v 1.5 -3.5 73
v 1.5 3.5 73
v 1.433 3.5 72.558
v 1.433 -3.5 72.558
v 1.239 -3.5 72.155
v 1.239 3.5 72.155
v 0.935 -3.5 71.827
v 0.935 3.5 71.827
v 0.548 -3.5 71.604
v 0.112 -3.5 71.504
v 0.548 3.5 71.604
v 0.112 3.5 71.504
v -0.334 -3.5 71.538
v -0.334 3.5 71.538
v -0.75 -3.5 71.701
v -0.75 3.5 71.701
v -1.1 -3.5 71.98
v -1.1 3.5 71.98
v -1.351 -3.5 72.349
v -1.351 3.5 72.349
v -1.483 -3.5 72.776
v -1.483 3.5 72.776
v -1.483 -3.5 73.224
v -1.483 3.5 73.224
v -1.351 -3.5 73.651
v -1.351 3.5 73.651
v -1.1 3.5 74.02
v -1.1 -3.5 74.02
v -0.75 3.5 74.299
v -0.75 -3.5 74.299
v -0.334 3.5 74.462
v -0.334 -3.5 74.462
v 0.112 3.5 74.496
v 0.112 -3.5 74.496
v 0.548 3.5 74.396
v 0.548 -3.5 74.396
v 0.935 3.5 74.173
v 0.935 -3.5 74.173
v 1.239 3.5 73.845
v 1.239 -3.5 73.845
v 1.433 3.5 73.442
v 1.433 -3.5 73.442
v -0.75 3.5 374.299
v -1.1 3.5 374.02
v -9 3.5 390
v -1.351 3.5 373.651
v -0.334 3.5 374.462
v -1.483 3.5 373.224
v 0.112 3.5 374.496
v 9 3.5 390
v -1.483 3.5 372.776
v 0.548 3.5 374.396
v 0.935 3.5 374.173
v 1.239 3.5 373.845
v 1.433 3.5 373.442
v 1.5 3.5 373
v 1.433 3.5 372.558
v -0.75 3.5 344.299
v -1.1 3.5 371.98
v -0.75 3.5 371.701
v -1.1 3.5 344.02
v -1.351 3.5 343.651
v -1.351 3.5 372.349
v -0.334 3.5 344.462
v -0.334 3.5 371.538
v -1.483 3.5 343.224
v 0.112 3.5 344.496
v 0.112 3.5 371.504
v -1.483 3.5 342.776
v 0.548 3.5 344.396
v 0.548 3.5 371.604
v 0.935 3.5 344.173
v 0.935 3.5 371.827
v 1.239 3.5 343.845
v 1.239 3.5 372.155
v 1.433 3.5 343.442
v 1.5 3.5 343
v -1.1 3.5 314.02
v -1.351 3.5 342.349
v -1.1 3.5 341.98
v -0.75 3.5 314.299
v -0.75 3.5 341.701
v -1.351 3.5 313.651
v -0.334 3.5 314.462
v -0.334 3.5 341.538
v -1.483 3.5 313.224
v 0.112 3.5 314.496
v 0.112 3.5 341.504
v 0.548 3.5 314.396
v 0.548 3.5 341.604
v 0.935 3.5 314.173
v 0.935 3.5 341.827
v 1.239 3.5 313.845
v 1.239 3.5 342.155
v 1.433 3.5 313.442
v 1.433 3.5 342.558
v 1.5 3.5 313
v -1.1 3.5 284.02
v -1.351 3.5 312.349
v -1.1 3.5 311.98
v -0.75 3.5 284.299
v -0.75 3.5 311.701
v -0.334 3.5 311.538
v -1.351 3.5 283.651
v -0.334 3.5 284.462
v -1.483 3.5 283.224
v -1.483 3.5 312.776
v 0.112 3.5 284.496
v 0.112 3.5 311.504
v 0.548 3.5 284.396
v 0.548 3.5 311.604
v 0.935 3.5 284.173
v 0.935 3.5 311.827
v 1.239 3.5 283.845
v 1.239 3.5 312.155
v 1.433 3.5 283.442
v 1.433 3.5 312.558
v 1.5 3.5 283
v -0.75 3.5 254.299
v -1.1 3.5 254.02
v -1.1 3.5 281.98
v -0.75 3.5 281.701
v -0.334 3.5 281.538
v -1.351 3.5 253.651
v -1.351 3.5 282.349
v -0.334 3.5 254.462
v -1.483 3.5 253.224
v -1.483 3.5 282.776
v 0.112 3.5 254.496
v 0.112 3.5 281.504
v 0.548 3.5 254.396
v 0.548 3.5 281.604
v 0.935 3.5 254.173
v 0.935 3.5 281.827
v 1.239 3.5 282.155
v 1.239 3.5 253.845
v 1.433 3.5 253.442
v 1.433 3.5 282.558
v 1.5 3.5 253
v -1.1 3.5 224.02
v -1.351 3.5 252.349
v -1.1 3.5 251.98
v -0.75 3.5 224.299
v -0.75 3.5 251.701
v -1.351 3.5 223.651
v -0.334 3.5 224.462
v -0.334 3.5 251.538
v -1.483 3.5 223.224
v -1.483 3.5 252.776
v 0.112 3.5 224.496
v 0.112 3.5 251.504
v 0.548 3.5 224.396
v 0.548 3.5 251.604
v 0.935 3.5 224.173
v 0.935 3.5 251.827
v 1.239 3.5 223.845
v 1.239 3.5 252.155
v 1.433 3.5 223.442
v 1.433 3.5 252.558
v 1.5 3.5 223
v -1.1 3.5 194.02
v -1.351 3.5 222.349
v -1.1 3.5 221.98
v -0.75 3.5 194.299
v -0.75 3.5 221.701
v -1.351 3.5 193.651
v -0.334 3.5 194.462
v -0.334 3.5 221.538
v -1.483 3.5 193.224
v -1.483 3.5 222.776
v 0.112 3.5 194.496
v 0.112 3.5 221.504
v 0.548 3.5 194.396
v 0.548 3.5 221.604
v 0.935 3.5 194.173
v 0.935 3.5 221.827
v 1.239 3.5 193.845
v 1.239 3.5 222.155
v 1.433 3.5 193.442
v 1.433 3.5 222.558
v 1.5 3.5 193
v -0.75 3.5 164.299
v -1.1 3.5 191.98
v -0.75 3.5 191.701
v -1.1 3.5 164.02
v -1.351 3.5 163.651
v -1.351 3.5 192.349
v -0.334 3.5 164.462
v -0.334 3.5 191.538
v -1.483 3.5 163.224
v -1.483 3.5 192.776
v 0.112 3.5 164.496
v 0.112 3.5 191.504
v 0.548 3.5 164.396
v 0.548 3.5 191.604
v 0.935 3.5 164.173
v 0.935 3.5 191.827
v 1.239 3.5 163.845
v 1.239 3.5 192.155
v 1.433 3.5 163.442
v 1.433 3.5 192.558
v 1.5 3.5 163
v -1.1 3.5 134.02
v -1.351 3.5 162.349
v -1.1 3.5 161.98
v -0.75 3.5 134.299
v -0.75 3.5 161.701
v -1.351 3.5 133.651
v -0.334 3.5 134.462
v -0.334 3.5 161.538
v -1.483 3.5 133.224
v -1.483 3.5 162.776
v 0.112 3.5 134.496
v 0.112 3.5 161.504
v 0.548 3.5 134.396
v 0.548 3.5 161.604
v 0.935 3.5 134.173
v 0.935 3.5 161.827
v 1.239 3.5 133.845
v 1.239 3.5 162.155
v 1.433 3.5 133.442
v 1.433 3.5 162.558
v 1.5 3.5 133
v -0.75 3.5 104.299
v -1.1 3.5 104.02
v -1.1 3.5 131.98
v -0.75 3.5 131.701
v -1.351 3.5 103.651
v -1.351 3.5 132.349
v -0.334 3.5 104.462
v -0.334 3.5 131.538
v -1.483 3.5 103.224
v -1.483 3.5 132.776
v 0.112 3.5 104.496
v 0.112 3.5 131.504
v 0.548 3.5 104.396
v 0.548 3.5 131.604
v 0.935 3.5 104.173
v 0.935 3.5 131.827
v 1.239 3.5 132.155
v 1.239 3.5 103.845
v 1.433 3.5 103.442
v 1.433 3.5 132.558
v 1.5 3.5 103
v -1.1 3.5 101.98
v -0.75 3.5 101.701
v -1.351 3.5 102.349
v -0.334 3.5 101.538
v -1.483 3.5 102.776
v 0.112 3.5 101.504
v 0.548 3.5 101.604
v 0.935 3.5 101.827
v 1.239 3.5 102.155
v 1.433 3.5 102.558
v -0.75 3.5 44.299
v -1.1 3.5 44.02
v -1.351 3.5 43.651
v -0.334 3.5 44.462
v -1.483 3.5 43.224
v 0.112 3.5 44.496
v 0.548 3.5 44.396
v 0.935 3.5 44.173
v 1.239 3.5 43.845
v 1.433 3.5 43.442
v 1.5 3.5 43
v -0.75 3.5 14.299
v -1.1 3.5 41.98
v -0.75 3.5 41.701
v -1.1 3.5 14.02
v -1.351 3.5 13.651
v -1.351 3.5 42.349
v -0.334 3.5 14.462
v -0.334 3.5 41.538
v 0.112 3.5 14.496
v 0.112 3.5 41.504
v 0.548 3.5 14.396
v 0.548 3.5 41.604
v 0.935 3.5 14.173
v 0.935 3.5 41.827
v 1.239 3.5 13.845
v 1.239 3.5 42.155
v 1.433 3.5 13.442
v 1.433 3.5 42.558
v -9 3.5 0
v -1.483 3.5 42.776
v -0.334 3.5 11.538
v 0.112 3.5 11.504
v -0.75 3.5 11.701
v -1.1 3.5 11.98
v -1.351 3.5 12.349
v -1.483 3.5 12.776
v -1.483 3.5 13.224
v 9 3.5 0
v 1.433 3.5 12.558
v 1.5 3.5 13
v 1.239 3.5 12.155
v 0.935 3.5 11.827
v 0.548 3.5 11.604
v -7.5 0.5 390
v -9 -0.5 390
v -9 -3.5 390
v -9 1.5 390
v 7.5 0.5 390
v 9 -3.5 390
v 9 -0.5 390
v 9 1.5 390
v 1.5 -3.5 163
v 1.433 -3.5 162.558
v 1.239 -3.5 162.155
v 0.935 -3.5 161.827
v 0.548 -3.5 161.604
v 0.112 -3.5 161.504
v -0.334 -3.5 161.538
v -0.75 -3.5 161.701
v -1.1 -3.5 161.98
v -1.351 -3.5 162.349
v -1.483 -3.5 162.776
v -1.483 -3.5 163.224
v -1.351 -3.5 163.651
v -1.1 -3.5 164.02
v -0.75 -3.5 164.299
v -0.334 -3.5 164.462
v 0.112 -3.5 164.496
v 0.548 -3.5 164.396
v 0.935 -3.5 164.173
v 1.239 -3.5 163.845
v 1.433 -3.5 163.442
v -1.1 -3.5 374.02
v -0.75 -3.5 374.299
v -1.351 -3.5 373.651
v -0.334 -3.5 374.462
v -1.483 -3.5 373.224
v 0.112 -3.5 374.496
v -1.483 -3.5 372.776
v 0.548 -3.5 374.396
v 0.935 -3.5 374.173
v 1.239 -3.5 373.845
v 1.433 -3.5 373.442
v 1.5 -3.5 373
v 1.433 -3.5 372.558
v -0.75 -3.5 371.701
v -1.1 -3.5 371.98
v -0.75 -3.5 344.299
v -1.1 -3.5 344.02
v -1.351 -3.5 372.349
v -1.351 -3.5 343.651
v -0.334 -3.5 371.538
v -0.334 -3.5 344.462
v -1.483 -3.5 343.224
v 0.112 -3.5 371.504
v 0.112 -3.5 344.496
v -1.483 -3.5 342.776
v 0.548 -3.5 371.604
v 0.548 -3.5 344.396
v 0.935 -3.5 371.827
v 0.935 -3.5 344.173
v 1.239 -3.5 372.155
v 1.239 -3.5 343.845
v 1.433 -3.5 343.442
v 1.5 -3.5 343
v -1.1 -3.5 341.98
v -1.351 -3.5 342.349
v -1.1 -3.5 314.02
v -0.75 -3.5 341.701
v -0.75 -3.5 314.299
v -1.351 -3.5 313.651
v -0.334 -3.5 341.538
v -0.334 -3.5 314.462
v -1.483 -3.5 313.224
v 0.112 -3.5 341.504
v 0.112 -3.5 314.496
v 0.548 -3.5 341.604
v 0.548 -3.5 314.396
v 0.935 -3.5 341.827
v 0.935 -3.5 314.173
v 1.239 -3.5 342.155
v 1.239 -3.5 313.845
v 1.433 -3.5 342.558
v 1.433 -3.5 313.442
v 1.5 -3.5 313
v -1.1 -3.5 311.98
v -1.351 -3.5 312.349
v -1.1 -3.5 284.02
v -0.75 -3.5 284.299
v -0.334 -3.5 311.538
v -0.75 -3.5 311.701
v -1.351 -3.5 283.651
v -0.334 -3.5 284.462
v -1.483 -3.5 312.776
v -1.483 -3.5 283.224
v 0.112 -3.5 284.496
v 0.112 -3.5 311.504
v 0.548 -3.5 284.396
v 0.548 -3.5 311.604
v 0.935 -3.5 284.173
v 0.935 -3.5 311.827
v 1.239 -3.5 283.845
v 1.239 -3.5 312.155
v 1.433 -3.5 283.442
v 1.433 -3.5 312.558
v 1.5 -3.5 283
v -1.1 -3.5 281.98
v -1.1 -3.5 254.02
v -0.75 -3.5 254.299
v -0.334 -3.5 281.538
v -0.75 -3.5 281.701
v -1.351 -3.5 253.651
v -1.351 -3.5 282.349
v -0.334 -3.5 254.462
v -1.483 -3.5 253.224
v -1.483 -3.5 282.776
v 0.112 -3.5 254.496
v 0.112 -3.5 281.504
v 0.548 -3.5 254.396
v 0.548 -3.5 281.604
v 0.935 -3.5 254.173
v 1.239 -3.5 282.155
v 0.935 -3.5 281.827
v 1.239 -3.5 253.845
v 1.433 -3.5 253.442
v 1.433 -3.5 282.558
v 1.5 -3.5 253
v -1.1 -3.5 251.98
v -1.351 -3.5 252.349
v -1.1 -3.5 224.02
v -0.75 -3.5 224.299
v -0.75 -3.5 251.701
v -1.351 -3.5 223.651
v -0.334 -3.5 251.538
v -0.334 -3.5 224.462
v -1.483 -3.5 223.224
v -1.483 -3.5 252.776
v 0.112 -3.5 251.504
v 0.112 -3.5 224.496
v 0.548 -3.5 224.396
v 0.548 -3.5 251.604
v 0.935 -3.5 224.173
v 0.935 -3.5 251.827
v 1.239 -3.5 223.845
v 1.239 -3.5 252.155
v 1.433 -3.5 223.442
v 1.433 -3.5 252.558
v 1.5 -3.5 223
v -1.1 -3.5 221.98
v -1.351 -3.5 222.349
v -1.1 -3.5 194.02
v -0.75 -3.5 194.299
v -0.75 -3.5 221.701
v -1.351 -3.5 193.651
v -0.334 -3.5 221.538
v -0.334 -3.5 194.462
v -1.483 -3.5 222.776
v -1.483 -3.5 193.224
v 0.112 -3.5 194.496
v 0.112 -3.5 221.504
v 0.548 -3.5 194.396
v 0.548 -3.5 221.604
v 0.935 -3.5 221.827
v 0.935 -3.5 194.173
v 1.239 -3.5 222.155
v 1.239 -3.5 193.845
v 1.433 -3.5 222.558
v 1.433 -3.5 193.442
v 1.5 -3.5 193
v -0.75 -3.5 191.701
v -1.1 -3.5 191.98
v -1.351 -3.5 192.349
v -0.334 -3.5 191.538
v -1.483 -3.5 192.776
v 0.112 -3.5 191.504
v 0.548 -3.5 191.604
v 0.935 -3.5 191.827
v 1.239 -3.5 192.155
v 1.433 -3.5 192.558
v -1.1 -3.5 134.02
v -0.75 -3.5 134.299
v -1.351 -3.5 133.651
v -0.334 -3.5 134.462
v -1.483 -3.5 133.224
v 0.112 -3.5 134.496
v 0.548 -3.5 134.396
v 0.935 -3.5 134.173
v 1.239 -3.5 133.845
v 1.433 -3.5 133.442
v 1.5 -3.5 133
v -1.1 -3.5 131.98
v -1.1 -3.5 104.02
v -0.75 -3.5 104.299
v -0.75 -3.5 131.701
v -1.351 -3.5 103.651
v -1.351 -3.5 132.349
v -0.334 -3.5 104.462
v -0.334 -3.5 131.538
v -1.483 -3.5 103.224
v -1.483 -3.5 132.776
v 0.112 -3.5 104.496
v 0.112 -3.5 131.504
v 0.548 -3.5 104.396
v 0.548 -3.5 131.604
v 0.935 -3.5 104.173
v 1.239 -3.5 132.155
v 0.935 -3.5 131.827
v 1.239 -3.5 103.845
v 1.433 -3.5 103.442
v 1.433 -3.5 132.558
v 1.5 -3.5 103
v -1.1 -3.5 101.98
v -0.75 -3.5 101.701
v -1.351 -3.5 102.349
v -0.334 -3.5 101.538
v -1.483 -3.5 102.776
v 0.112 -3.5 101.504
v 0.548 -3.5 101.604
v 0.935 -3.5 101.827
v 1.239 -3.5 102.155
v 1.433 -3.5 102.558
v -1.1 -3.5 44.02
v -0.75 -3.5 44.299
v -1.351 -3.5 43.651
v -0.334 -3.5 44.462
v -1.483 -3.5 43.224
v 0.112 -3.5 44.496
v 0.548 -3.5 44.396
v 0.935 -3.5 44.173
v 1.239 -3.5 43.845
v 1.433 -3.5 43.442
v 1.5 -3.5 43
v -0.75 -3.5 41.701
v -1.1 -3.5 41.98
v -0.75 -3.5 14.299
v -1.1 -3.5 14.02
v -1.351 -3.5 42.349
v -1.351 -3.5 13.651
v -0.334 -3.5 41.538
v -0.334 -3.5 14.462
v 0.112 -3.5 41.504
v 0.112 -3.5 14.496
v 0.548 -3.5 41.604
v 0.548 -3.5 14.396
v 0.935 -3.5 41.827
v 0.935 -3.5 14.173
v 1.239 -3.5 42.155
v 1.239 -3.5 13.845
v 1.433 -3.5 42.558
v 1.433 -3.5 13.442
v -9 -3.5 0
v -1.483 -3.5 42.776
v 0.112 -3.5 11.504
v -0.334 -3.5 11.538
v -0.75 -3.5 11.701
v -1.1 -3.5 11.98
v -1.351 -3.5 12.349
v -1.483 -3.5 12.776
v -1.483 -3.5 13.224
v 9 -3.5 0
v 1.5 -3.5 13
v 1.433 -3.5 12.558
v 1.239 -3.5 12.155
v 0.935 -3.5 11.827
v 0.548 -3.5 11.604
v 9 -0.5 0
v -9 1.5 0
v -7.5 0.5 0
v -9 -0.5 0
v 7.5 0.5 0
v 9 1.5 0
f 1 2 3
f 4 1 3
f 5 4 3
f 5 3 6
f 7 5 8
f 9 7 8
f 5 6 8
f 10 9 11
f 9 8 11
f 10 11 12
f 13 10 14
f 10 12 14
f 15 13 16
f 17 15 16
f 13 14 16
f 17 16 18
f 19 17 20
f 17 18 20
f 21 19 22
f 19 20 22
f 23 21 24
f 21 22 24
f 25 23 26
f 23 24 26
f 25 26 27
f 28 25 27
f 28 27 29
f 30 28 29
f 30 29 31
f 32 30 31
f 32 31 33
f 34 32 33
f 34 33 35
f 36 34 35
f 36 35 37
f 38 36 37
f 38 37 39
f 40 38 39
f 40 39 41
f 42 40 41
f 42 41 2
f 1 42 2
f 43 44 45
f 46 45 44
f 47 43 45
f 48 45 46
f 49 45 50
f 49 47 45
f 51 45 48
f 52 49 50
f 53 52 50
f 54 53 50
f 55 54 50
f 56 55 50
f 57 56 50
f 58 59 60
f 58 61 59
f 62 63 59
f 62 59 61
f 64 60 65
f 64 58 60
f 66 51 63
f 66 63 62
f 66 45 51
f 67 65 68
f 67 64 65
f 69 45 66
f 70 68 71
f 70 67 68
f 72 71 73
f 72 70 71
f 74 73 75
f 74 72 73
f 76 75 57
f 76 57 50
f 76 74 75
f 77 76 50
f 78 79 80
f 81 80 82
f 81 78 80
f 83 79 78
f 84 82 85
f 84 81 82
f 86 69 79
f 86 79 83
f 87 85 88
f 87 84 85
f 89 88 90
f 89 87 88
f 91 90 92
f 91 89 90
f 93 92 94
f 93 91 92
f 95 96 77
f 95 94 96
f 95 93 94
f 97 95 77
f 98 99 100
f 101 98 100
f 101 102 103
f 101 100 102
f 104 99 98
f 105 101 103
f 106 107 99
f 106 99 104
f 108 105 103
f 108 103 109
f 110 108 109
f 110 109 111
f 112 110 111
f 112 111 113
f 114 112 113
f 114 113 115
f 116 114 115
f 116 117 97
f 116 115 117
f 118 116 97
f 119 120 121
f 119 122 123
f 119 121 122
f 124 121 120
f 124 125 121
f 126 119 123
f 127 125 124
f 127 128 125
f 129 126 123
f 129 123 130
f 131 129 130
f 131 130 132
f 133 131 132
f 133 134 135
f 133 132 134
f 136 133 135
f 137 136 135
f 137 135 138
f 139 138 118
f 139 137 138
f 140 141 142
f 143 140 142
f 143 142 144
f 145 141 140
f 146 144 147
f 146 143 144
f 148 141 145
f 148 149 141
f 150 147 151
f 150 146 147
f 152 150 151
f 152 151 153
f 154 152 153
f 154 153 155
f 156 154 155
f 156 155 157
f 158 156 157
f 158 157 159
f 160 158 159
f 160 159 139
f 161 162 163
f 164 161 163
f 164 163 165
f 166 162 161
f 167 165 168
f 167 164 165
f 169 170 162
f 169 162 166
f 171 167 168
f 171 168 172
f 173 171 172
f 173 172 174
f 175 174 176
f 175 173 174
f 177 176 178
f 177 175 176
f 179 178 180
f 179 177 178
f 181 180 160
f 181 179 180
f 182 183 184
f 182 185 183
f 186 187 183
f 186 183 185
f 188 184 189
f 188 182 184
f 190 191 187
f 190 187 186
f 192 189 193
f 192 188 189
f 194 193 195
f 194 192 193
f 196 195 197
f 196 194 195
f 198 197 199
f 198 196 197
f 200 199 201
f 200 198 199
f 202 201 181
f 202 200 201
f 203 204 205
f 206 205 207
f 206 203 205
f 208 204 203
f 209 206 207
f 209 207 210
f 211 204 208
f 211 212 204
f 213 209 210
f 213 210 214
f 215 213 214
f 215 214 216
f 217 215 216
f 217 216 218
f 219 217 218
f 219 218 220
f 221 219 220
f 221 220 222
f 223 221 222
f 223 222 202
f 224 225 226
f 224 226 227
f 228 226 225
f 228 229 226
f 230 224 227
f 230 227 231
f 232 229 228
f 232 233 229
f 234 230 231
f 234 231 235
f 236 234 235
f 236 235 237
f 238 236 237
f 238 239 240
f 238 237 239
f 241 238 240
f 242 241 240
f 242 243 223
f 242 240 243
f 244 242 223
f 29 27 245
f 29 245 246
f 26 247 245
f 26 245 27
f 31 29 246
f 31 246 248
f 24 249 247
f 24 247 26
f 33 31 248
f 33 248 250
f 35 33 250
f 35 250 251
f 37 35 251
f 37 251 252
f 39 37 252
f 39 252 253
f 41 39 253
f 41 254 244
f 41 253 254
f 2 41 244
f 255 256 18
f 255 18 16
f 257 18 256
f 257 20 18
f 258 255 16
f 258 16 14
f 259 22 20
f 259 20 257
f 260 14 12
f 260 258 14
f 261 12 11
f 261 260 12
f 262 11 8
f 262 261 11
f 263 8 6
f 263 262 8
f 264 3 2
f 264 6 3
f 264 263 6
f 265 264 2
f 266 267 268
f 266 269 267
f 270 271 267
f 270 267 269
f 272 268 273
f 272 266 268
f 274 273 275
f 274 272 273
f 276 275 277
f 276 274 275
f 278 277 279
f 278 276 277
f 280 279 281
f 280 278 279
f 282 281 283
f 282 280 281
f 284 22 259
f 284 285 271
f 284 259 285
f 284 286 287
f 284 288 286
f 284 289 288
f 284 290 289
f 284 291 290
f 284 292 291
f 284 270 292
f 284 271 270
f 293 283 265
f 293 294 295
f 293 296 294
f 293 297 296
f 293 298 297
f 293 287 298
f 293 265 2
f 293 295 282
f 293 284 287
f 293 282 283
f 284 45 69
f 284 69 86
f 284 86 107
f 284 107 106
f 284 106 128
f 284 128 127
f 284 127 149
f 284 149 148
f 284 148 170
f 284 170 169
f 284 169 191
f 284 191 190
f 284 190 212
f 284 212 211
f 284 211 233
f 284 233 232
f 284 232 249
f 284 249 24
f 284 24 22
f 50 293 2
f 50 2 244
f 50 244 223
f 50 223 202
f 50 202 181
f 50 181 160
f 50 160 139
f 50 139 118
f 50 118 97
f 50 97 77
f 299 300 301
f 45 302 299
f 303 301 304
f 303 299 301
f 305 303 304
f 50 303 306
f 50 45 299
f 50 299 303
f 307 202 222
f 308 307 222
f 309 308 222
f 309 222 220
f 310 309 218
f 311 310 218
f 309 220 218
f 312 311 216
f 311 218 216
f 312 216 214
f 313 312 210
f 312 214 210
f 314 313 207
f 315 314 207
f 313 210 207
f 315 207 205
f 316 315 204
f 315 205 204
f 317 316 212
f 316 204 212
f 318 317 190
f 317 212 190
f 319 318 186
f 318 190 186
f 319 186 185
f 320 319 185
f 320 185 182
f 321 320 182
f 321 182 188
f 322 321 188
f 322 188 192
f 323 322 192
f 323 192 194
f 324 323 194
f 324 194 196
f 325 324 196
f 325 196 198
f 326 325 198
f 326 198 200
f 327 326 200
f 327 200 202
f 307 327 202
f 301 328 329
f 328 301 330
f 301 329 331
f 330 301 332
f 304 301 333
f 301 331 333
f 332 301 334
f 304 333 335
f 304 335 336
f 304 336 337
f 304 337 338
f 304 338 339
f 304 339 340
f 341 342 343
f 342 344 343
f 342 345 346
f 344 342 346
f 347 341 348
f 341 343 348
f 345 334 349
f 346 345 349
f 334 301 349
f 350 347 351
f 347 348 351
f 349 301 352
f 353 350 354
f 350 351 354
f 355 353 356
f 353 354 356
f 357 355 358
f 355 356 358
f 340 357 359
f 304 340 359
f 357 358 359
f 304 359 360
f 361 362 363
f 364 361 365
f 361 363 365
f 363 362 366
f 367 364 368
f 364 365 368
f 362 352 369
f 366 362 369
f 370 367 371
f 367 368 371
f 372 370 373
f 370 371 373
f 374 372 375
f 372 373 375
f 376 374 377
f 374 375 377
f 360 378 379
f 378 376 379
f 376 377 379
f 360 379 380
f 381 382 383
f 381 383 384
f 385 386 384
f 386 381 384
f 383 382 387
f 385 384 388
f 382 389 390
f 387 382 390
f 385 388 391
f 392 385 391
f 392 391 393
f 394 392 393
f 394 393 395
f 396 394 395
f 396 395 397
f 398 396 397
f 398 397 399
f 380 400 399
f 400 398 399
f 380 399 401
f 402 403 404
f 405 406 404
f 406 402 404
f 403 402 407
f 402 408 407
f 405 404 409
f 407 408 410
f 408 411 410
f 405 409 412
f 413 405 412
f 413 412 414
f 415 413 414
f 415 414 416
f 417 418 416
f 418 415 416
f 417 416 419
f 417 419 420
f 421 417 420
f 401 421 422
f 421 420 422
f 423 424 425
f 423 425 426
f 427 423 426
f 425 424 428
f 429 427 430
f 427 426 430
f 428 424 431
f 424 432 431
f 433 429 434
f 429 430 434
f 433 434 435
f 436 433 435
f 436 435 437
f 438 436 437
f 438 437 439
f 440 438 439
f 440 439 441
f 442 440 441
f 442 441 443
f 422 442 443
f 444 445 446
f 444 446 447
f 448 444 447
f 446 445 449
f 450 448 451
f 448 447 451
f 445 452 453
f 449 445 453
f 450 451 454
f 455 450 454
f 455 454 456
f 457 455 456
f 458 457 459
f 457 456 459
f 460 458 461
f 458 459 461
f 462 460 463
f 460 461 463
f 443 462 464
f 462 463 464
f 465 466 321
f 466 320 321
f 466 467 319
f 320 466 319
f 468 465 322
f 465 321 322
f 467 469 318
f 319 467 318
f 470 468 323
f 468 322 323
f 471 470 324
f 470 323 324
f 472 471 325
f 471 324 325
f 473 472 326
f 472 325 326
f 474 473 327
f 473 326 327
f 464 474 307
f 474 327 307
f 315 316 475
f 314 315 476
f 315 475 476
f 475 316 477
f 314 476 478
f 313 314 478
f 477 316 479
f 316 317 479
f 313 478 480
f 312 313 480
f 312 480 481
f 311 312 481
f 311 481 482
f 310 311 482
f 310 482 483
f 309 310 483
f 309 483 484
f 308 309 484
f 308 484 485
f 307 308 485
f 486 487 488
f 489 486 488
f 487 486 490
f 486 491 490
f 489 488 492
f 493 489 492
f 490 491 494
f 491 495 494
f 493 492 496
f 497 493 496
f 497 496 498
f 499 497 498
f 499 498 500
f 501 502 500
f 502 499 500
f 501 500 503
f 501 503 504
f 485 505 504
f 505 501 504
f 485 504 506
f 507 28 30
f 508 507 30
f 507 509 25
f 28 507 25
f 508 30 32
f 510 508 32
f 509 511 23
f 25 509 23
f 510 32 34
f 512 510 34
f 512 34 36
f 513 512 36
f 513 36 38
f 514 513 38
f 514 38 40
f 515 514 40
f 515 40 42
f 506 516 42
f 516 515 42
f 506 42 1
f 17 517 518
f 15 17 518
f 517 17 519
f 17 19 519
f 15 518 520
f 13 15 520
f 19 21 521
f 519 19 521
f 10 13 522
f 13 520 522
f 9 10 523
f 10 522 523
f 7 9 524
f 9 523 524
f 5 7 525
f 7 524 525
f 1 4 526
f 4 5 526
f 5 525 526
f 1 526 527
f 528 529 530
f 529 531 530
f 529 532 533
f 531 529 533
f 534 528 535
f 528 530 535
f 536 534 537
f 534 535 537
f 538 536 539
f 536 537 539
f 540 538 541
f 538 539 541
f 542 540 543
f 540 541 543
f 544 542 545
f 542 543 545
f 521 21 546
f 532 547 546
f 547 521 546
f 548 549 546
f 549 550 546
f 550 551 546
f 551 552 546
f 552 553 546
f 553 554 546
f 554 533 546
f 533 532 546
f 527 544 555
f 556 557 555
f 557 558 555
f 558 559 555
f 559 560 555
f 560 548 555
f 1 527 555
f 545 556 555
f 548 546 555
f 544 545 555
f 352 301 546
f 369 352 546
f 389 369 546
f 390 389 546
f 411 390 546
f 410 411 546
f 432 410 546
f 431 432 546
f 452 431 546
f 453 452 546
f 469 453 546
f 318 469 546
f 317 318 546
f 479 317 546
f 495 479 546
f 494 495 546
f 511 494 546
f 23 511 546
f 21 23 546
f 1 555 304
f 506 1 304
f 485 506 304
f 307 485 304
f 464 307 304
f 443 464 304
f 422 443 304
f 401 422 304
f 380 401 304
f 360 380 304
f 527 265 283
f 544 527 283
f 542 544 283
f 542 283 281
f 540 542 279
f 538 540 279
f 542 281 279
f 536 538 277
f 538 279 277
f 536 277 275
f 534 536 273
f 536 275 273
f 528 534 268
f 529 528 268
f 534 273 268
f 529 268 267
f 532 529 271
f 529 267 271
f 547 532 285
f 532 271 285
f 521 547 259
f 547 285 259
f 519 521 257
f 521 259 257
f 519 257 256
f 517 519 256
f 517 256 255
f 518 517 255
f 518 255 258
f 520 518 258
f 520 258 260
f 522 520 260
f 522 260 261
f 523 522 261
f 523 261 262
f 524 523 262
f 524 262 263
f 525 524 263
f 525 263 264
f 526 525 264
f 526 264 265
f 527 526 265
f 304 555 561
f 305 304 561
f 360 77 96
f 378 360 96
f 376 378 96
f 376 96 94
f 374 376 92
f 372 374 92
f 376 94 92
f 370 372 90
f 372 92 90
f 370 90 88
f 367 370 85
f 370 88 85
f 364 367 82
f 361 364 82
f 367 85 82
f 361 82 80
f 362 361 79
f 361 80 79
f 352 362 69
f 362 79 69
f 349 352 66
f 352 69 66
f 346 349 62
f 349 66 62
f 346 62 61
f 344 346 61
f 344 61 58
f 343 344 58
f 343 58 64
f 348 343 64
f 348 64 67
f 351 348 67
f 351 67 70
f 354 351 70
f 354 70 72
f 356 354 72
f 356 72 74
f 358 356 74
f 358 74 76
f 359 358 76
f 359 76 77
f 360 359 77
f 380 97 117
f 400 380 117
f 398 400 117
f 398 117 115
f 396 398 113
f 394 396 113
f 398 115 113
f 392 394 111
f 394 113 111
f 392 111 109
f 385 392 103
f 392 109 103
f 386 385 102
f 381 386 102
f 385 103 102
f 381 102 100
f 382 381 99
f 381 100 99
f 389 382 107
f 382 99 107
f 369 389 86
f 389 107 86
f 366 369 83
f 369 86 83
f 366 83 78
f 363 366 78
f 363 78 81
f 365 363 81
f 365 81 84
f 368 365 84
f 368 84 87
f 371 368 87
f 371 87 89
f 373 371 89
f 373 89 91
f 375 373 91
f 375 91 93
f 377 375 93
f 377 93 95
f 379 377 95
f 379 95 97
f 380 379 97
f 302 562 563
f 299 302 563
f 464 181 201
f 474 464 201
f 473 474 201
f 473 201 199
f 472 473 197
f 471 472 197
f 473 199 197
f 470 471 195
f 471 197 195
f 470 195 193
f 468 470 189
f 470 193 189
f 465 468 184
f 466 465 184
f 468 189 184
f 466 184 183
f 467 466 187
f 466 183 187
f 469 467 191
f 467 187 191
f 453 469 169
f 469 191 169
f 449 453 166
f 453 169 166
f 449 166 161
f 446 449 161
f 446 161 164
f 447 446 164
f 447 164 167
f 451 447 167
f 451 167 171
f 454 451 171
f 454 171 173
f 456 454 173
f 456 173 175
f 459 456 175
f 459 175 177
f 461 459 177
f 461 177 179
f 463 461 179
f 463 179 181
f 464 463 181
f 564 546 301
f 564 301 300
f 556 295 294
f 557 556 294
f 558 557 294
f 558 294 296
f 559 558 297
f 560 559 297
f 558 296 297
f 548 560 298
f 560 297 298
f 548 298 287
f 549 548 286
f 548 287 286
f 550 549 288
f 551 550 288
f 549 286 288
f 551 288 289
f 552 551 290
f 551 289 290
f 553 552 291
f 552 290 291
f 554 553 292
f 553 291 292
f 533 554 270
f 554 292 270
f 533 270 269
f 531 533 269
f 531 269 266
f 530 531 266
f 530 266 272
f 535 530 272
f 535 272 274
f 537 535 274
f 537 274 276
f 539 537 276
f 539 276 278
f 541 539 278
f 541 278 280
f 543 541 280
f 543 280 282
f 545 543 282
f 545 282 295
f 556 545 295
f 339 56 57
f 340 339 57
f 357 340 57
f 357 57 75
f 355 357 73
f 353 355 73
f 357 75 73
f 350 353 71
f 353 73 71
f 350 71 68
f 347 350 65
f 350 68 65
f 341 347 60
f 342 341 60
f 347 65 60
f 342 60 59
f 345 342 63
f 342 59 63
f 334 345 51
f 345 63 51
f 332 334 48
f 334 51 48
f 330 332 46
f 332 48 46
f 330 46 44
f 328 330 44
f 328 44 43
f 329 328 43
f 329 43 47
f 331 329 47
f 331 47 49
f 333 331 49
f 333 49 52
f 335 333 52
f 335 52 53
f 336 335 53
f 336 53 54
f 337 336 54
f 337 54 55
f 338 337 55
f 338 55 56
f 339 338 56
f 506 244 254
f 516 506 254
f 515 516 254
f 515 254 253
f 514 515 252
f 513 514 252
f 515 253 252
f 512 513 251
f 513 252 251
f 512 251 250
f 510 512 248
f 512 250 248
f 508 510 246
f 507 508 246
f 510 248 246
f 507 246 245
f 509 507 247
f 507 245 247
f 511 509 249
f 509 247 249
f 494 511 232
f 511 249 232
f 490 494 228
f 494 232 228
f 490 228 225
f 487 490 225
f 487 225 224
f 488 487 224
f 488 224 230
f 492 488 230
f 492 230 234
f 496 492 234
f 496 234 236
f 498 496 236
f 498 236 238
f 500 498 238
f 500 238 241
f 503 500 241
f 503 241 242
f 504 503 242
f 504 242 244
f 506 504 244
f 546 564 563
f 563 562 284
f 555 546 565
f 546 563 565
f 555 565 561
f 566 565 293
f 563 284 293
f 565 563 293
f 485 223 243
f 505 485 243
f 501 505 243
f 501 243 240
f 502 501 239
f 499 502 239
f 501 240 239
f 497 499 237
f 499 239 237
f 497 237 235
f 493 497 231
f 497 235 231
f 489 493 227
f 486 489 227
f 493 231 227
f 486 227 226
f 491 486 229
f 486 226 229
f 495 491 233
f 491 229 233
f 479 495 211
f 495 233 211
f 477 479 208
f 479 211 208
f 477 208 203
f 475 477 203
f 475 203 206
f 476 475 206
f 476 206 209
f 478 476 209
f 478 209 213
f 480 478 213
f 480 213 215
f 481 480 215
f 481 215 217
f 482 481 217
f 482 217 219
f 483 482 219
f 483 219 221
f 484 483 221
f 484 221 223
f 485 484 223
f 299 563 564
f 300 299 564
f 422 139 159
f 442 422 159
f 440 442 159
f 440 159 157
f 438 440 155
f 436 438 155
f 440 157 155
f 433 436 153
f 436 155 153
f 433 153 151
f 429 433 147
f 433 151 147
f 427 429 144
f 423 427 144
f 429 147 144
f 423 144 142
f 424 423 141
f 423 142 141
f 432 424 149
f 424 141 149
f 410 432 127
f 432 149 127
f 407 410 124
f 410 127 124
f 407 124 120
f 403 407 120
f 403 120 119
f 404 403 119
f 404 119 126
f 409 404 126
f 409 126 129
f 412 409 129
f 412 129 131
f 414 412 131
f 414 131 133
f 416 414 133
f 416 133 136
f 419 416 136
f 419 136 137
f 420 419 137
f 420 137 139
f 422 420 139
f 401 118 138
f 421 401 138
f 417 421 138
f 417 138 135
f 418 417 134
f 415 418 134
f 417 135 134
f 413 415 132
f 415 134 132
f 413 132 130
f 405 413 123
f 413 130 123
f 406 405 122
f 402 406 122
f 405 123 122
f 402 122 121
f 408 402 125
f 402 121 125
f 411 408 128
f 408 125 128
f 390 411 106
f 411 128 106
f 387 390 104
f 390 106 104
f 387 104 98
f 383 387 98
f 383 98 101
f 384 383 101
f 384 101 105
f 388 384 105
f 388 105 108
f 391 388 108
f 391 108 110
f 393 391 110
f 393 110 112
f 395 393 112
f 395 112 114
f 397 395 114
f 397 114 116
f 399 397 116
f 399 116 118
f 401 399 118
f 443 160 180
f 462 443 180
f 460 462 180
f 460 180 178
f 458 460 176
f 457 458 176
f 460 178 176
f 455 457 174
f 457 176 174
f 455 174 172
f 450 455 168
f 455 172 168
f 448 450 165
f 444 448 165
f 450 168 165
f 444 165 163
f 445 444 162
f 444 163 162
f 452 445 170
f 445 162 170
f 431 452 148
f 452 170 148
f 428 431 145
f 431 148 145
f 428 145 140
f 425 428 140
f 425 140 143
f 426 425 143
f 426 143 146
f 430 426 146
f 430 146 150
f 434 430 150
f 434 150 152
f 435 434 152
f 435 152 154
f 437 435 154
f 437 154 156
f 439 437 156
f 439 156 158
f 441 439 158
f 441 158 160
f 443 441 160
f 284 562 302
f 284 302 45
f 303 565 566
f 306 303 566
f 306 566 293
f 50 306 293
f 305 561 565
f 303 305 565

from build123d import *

# Parameters (mm, degrees)
SKETCH1_W           = 18
SKETCH1_H           = 7
BOSS_EXTRUDE1_DEPTH = 390
SKETCH3_R           = 1.5
CUT_EXTRUDE1_DEPTH  = 390
CUT_EXTRUDE2_DEPTH  = 390


with BuildPart() as part:
    # Sketch1 → Boss-Extrude1 (new body)
    with BuildSketch(Plane.XY):
        Rectangle(SKETCH1_W, SKETCH1_H)
    extrude(amount=BOSS_EXTRUDE1_DEPTH)

    # Sketch3 → Cut-Extrude1 (cut)
    with BuildSketch(Plane(origin=(0, 3.5, 0), x_dir=(1, 0, 0), z_dir=(0, 1, 0))):
        with Locations((0, -13)):
            Circle(SKETCH3_R)
        with Locations((0, -43)):
            Circle(SKETCH3_R)
        with Locations((0, -73)):
            Circle(SKETCH3_R)
        with Locations((0, -103)):
            Circle(SKETCH3_R)
        with Locations((0, -133)):
            Circle(SKETCH3_R)
        with Locations((0, -163)):
            Circle(SKETCH3_R)
        with Locations((0, -193)):
            Circle(SKETCH3_R)
        with Locations((0, -223)):
            Circle(SKETCH3_R)
        with Locations((0, -253)):
            Circle(SKETCH3_R)
        with Locations((0, -283)):
            Circle(SKETCH3_R)
        with Locations((0, -313)):
            Circle(SKETCH3_R)
        with Locations((0, -343)):
            Circle(SKETCH3_R)
        with Locations((0, -373)):
            Circle(SKETCH3_R)
    extrude(amount=-CUT_EXTRUDE1_DEPTH, mode=Mode.SUBTRACT)

    # Sketch5 → Cut-Extrude2 (cut)
    with BuildSketch(Plane(origin=(0, 0, 0), x_dir=(-1, 0, 0), z_dir=(0, 0, -1))):
        Polygon((-9, 1.5), (-9, -0.5), (-7.5, 0.5), align=None)
        Polygon((9, -0.5), (9, 1.5), (7.5, 0.5), align=None)
    extrude(amount=-CUT_EXTRUDE2_DEPTH, mode=Mode.SUBTRACT)


solid = part.part
